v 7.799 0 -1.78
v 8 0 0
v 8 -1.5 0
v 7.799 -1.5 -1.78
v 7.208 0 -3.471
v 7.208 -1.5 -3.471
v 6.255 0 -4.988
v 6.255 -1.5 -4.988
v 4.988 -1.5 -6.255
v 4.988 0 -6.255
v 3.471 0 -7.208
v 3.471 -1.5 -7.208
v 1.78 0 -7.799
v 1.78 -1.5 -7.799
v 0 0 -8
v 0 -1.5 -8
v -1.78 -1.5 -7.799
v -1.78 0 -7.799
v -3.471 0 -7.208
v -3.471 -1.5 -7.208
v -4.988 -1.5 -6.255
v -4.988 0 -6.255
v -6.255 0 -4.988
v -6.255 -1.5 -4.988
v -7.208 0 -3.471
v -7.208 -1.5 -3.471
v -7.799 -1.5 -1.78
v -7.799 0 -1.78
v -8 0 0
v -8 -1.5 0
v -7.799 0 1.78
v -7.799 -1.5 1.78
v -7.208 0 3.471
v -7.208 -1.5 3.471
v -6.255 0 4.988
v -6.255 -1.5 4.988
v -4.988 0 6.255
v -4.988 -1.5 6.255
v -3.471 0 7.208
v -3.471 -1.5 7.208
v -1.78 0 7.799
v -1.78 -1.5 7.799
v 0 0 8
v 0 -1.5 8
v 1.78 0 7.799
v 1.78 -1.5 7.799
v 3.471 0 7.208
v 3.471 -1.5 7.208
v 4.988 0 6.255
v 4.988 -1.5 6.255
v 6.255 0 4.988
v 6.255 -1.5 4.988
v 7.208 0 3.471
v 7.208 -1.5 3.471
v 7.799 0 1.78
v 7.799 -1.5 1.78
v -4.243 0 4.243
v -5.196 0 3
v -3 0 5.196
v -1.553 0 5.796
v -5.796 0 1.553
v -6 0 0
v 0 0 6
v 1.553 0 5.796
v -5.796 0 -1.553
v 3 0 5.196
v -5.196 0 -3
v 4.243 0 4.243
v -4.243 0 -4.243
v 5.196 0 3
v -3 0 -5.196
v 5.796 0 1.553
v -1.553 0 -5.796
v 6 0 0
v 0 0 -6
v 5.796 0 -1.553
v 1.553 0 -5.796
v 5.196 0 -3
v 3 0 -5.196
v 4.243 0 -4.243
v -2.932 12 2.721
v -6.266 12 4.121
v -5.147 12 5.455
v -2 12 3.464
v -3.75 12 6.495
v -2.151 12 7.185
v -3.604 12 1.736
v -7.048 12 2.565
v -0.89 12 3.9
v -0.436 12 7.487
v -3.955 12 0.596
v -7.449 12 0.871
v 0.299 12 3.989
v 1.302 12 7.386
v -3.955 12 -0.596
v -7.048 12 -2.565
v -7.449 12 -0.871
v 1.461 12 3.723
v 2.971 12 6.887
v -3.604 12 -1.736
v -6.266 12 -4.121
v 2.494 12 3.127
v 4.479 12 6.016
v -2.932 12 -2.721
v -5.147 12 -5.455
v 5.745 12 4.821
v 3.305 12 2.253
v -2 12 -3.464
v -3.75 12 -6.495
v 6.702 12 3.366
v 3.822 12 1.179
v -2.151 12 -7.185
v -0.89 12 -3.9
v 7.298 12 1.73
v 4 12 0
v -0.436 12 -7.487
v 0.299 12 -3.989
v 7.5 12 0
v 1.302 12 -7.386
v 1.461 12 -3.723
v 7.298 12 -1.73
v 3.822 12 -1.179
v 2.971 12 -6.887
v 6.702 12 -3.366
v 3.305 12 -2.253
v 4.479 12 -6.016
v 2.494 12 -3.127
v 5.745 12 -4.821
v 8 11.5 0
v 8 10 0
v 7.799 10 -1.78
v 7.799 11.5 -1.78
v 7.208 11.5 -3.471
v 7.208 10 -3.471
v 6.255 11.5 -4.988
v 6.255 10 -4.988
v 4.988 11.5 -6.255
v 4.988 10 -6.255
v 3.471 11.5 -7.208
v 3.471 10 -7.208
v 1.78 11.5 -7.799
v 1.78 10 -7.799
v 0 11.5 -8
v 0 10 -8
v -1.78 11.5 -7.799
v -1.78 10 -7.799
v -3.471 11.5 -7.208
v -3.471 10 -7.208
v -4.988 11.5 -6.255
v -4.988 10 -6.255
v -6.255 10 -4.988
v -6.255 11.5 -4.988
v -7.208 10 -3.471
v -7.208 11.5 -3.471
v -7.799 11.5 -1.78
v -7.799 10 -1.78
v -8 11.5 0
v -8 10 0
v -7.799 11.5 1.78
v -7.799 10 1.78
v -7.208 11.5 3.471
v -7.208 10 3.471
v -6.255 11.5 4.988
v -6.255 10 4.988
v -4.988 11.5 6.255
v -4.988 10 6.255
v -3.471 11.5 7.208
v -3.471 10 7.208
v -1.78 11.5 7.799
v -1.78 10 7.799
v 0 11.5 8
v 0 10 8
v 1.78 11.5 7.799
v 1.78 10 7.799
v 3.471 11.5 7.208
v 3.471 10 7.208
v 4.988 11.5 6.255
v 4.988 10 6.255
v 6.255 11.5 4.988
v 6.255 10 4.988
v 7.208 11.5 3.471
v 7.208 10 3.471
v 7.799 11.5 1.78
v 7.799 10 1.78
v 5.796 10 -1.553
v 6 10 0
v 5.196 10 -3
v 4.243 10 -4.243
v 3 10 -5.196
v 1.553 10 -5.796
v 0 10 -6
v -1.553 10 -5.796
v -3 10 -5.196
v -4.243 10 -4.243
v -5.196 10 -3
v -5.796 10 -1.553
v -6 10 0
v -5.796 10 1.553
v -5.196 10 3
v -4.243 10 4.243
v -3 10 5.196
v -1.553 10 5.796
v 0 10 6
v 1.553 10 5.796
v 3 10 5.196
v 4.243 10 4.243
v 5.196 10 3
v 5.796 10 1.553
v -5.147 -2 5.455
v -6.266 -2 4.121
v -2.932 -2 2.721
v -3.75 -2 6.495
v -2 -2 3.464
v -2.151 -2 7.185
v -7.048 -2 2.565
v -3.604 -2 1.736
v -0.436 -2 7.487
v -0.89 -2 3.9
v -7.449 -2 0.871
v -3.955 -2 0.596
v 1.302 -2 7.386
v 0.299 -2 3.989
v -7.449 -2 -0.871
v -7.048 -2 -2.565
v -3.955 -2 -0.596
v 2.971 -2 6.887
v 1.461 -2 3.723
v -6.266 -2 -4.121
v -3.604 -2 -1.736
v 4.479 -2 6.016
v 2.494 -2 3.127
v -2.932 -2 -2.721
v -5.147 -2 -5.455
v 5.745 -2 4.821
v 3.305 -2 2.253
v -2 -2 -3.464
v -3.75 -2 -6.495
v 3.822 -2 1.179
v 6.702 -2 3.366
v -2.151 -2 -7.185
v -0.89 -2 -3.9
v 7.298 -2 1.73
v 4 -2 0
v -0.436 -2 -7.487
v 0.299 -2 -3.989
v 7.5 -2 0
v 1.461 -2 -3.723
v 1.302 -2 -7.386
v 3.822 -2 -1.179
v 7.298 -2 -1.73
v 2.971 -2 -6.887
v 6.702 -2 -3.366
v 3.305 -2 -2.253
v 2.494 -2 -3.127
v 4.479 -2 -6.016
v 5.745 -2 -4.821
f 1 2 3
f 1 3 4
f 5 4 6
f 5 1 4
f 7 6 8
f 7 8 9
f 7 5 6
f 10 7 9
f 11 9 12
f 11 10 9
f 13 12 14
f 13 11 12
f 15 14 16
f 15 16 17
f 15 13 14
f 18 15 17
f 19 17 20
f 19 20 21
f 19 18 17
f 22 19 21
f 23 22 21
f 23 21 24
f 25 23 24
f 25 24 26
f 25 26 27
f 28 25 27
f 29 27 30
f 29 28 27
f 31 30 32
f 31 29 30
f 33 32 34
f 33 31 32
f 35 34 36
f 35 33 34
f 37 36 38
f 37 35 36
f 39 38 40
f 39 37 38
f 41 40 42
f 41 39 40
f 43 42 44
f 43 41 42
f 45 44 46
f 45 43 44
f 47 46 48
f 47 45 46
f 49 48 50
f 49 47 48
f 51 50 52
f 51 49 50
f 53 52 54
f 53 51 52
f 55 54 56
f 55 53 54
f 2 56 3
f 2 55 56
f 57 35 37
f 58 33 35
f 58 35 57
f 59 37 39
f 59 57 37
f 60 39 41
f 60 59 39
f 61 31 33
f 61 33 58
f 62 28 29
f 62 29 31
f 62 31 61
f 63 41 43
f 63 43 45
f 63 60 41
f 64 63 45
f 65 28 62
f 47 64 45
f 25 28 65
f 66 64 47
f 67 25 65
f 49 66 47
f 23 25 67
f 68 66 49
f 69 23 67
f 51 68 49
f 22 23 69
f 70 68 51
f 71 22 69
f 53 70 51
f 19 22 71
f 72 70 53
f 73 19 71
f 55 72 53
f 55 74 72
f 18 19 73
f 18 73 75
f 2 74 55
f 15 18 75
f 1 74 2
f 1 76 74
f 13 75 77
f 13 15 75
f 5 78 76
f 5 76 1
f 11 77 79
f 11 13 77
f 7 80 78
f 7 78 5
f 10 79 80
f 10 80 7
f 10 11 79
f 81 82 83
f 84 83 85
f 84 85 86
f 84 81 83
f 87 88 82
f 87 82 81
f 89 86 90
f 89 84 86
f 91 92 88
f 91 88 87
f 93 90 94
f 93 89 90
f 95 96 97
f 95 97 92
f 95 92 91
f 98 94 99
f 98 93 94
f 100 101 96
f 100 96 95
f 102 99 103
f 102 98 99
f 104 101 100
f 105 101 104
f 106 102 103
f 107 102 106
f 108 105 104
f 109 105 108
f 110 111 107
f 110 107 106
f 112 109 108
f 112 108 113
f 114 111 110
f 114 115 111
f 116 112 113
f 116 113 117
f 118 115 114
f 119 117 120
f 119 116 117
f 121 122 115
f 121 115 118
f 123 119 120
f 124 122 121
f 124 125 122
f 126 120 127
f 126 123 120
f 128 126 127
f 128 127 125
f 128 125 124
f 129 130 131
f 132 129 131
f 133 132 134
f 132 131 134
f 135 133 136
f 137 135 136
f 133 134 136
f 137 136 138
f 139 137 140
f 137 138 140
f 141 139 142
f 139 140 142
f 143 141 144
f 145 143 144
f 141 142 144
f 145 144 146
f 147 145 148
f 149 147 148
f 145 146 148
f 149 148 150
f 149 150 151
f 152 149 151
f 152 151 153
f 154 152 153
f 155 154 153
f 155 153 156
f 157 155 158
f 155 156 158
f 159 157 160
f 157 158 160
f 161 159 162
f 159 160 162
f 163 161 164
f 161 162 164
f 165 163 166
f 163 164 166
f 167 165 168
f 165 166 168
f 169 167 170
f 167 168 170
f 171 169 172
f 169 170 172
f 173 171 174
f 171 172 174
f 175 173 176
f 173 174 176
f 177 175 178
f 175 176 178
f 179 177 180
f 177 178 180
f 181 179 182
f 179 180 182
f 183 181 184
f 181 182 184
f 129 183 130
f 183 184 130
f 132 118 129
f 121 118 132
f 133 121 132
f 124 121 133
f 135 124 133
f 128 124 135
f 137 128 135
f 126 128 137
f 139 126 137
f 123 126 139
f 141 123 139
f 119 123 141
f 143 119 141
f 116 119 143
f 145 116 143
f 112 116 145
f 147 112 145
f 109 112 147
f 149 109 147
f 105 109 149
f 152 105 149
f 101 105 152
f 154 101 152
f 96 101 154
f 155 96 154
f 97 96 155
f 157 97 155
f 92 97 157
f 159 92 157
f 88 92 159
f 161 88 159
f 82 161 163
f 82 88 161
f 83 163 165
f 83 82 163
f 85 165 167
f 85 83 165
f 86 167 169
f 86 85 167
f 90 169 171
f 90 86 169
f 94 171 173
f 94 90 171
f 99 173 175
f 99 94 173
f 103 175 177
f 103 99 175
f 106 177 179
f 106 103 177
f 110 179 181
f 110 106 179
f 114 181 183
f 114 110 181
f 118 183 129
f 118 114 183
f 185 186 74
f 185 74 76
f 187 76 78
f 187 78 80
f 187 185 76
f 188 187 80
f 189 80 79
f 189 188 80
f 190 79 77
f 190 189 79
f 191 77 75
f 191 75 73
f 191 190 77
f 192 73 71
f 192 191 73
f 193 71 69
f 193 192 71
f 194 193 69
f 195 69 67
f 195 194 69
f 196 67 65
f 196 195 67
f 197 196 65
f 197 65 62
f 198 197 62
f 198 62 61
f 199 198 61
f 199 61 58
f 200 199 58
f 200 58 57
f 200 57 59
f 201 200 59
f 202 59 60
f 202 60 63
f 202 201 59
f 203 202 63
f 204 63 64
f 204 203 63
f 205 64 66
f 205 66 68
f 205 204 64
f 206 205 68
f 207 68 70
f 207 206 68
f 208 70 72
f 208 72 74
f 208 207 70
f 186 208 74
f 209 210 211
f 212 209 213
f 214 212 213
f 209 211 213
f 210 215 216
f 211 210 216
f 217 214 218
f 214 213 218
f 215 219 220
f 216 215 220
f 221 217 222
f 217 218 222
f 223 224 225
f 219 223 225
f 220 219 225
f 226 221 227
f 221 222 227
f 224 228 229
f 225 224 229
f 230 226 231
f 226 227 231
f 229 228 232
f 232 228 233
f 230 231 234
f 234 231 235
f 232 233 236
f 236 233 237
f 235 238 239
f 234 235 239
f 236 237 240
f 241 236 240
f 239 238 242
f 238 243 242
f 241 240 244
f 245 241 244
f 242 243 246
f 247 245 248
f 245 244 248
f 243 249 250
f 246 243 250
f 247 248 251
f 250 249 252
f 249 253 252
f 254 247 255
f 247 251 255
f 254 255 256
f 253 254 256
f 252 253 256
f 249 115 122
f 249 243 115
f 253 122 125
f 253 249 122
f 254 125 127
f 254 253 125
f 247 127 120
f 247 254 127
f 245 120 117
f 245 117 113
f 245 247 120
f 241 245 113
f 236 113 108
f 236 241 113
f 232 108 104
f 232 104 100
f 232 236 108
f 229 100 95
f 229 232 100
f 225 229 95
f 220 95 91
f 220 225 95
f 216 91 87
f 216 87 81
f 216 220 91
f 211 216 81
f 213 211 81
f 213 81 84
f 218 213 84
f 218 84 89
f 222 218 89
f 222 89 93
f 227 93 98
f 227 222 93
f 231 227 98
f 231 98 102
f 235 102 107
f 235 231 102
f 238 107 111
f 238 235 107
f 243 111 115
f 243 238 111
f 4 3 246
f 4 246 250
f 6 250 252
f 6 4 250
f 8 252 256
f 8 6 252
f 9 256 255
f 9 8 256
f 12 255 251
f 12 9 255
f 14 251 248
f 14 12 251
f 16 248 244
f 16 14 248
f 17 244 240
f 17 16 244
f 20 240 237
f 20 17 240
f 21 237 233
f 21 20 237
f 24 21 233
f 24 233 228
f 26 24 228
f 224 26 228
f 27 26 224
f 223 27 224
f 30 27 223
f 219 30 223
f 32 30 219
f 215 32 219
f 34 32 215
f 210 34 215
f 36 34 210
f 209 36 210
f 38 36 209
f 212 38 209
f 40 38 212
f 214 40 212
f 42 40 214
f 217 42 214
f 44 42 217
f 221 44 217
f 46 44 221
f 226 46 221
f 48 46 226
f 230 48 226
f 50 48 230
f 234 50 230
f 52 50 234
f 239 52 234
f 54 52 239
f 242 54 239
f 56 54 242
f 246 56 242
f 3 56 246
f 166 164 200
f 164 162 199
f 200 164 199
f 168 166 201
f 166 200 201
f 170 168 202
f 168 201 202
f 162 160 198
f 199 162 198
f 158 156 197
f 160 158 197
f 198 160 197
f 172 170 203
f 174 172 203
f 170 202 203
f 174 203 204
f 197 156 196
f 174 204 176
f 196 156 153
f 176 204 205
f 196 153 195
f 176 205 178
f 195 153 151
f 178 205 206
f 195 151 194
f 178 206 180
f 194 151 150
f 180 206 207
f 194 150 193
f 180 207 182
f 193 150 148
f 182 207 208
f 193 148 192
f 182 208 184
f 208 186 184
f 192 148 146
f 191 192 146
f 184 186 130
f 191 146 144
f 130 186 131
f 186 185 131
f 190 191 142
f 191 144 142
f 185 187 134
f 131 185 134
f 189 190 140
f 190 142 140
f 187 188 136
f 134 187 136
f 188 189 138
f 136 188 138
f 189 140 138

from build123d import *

# Parameters (mm, degrees)
BOSS_EXTRUDE1_DEPTH      = 12
BOSS_EXTRUDE1_DEPTH_BACK = 2
SKETCH1_R                = 6
SKETCH1_R_2              = 4
SKETCH1_3_R              = 8
SKETCH1_3_R_2            = 6
BOSS_EXTRUDE2_DEPTH      = 2
BOSS_EXTRUDE3_START      = 10
SKETCH1_4_R              = 8
SKETCH1_4_R_2            = 6
BOSS_EXTRUDE3_DEPTH      = 2
CHAMFER1_SIZE            = 0.5


with BuildPart() as part:
    # Sketch1 → Boss-Extrude1 (new, two sides: drawn at the far end of the back side and taken through both)
    with BuildSketch(Plane(origin=(0, 0, 0), x_dir=(1, 0, 0), z_dir=(0, 1, 0)).offset(-BOSS_EXTRUDE1_DEPTH_BACK)):
        Circle(SKETCH1_R)
        Circle(SKETCH1_R_2, mode=Mode.SUBTRACT)
    extrude(amount=BOSS_EXTRUDE1_DEPTH + BOSS_EXTRUDE1_DEPTH_BACK)

    # Sketch1<3> → Boss-Extrude2 (add)
    with BuildSketch(Plane(origin=(0, 0, 0), x_dir=(1, 0, 0), z_dir=(0, 1, 0))):
        Circle(SKETCH1_3_R)
        Circle(SKETCH1_3_R_2, mode=Mode.SUBTRACT)
    extrude(amount=-BOSS_EXTRUDE2_DEPTH)

    # Sketch1<4> → Boss-Extrude3 (add)
    with BuildSketch(Plane(origin=(0, 0, 0), x_dir=(1, 0, 0), z_dir=(0, 1, 0)).offset(BOSS_EXTRUDE3_START)):
        Circle(SKETCH1_4_R)
        Circle(SKETCH1_4_R_2, mode=Mode.SUBTRACT)
    extrude(amount=BOSS_EXTRUDE3_DEPTH)

    # Chamfer1
    chamfer1_edges = [part.edges().sort_by_distance(p)[0] for p in [
        (-8, -2, 0),
        (-8, 12, 0),
    ]]
    chamfer(chamfer1_edges, length=CHAMFER1_SIZE)


solid = part.part
